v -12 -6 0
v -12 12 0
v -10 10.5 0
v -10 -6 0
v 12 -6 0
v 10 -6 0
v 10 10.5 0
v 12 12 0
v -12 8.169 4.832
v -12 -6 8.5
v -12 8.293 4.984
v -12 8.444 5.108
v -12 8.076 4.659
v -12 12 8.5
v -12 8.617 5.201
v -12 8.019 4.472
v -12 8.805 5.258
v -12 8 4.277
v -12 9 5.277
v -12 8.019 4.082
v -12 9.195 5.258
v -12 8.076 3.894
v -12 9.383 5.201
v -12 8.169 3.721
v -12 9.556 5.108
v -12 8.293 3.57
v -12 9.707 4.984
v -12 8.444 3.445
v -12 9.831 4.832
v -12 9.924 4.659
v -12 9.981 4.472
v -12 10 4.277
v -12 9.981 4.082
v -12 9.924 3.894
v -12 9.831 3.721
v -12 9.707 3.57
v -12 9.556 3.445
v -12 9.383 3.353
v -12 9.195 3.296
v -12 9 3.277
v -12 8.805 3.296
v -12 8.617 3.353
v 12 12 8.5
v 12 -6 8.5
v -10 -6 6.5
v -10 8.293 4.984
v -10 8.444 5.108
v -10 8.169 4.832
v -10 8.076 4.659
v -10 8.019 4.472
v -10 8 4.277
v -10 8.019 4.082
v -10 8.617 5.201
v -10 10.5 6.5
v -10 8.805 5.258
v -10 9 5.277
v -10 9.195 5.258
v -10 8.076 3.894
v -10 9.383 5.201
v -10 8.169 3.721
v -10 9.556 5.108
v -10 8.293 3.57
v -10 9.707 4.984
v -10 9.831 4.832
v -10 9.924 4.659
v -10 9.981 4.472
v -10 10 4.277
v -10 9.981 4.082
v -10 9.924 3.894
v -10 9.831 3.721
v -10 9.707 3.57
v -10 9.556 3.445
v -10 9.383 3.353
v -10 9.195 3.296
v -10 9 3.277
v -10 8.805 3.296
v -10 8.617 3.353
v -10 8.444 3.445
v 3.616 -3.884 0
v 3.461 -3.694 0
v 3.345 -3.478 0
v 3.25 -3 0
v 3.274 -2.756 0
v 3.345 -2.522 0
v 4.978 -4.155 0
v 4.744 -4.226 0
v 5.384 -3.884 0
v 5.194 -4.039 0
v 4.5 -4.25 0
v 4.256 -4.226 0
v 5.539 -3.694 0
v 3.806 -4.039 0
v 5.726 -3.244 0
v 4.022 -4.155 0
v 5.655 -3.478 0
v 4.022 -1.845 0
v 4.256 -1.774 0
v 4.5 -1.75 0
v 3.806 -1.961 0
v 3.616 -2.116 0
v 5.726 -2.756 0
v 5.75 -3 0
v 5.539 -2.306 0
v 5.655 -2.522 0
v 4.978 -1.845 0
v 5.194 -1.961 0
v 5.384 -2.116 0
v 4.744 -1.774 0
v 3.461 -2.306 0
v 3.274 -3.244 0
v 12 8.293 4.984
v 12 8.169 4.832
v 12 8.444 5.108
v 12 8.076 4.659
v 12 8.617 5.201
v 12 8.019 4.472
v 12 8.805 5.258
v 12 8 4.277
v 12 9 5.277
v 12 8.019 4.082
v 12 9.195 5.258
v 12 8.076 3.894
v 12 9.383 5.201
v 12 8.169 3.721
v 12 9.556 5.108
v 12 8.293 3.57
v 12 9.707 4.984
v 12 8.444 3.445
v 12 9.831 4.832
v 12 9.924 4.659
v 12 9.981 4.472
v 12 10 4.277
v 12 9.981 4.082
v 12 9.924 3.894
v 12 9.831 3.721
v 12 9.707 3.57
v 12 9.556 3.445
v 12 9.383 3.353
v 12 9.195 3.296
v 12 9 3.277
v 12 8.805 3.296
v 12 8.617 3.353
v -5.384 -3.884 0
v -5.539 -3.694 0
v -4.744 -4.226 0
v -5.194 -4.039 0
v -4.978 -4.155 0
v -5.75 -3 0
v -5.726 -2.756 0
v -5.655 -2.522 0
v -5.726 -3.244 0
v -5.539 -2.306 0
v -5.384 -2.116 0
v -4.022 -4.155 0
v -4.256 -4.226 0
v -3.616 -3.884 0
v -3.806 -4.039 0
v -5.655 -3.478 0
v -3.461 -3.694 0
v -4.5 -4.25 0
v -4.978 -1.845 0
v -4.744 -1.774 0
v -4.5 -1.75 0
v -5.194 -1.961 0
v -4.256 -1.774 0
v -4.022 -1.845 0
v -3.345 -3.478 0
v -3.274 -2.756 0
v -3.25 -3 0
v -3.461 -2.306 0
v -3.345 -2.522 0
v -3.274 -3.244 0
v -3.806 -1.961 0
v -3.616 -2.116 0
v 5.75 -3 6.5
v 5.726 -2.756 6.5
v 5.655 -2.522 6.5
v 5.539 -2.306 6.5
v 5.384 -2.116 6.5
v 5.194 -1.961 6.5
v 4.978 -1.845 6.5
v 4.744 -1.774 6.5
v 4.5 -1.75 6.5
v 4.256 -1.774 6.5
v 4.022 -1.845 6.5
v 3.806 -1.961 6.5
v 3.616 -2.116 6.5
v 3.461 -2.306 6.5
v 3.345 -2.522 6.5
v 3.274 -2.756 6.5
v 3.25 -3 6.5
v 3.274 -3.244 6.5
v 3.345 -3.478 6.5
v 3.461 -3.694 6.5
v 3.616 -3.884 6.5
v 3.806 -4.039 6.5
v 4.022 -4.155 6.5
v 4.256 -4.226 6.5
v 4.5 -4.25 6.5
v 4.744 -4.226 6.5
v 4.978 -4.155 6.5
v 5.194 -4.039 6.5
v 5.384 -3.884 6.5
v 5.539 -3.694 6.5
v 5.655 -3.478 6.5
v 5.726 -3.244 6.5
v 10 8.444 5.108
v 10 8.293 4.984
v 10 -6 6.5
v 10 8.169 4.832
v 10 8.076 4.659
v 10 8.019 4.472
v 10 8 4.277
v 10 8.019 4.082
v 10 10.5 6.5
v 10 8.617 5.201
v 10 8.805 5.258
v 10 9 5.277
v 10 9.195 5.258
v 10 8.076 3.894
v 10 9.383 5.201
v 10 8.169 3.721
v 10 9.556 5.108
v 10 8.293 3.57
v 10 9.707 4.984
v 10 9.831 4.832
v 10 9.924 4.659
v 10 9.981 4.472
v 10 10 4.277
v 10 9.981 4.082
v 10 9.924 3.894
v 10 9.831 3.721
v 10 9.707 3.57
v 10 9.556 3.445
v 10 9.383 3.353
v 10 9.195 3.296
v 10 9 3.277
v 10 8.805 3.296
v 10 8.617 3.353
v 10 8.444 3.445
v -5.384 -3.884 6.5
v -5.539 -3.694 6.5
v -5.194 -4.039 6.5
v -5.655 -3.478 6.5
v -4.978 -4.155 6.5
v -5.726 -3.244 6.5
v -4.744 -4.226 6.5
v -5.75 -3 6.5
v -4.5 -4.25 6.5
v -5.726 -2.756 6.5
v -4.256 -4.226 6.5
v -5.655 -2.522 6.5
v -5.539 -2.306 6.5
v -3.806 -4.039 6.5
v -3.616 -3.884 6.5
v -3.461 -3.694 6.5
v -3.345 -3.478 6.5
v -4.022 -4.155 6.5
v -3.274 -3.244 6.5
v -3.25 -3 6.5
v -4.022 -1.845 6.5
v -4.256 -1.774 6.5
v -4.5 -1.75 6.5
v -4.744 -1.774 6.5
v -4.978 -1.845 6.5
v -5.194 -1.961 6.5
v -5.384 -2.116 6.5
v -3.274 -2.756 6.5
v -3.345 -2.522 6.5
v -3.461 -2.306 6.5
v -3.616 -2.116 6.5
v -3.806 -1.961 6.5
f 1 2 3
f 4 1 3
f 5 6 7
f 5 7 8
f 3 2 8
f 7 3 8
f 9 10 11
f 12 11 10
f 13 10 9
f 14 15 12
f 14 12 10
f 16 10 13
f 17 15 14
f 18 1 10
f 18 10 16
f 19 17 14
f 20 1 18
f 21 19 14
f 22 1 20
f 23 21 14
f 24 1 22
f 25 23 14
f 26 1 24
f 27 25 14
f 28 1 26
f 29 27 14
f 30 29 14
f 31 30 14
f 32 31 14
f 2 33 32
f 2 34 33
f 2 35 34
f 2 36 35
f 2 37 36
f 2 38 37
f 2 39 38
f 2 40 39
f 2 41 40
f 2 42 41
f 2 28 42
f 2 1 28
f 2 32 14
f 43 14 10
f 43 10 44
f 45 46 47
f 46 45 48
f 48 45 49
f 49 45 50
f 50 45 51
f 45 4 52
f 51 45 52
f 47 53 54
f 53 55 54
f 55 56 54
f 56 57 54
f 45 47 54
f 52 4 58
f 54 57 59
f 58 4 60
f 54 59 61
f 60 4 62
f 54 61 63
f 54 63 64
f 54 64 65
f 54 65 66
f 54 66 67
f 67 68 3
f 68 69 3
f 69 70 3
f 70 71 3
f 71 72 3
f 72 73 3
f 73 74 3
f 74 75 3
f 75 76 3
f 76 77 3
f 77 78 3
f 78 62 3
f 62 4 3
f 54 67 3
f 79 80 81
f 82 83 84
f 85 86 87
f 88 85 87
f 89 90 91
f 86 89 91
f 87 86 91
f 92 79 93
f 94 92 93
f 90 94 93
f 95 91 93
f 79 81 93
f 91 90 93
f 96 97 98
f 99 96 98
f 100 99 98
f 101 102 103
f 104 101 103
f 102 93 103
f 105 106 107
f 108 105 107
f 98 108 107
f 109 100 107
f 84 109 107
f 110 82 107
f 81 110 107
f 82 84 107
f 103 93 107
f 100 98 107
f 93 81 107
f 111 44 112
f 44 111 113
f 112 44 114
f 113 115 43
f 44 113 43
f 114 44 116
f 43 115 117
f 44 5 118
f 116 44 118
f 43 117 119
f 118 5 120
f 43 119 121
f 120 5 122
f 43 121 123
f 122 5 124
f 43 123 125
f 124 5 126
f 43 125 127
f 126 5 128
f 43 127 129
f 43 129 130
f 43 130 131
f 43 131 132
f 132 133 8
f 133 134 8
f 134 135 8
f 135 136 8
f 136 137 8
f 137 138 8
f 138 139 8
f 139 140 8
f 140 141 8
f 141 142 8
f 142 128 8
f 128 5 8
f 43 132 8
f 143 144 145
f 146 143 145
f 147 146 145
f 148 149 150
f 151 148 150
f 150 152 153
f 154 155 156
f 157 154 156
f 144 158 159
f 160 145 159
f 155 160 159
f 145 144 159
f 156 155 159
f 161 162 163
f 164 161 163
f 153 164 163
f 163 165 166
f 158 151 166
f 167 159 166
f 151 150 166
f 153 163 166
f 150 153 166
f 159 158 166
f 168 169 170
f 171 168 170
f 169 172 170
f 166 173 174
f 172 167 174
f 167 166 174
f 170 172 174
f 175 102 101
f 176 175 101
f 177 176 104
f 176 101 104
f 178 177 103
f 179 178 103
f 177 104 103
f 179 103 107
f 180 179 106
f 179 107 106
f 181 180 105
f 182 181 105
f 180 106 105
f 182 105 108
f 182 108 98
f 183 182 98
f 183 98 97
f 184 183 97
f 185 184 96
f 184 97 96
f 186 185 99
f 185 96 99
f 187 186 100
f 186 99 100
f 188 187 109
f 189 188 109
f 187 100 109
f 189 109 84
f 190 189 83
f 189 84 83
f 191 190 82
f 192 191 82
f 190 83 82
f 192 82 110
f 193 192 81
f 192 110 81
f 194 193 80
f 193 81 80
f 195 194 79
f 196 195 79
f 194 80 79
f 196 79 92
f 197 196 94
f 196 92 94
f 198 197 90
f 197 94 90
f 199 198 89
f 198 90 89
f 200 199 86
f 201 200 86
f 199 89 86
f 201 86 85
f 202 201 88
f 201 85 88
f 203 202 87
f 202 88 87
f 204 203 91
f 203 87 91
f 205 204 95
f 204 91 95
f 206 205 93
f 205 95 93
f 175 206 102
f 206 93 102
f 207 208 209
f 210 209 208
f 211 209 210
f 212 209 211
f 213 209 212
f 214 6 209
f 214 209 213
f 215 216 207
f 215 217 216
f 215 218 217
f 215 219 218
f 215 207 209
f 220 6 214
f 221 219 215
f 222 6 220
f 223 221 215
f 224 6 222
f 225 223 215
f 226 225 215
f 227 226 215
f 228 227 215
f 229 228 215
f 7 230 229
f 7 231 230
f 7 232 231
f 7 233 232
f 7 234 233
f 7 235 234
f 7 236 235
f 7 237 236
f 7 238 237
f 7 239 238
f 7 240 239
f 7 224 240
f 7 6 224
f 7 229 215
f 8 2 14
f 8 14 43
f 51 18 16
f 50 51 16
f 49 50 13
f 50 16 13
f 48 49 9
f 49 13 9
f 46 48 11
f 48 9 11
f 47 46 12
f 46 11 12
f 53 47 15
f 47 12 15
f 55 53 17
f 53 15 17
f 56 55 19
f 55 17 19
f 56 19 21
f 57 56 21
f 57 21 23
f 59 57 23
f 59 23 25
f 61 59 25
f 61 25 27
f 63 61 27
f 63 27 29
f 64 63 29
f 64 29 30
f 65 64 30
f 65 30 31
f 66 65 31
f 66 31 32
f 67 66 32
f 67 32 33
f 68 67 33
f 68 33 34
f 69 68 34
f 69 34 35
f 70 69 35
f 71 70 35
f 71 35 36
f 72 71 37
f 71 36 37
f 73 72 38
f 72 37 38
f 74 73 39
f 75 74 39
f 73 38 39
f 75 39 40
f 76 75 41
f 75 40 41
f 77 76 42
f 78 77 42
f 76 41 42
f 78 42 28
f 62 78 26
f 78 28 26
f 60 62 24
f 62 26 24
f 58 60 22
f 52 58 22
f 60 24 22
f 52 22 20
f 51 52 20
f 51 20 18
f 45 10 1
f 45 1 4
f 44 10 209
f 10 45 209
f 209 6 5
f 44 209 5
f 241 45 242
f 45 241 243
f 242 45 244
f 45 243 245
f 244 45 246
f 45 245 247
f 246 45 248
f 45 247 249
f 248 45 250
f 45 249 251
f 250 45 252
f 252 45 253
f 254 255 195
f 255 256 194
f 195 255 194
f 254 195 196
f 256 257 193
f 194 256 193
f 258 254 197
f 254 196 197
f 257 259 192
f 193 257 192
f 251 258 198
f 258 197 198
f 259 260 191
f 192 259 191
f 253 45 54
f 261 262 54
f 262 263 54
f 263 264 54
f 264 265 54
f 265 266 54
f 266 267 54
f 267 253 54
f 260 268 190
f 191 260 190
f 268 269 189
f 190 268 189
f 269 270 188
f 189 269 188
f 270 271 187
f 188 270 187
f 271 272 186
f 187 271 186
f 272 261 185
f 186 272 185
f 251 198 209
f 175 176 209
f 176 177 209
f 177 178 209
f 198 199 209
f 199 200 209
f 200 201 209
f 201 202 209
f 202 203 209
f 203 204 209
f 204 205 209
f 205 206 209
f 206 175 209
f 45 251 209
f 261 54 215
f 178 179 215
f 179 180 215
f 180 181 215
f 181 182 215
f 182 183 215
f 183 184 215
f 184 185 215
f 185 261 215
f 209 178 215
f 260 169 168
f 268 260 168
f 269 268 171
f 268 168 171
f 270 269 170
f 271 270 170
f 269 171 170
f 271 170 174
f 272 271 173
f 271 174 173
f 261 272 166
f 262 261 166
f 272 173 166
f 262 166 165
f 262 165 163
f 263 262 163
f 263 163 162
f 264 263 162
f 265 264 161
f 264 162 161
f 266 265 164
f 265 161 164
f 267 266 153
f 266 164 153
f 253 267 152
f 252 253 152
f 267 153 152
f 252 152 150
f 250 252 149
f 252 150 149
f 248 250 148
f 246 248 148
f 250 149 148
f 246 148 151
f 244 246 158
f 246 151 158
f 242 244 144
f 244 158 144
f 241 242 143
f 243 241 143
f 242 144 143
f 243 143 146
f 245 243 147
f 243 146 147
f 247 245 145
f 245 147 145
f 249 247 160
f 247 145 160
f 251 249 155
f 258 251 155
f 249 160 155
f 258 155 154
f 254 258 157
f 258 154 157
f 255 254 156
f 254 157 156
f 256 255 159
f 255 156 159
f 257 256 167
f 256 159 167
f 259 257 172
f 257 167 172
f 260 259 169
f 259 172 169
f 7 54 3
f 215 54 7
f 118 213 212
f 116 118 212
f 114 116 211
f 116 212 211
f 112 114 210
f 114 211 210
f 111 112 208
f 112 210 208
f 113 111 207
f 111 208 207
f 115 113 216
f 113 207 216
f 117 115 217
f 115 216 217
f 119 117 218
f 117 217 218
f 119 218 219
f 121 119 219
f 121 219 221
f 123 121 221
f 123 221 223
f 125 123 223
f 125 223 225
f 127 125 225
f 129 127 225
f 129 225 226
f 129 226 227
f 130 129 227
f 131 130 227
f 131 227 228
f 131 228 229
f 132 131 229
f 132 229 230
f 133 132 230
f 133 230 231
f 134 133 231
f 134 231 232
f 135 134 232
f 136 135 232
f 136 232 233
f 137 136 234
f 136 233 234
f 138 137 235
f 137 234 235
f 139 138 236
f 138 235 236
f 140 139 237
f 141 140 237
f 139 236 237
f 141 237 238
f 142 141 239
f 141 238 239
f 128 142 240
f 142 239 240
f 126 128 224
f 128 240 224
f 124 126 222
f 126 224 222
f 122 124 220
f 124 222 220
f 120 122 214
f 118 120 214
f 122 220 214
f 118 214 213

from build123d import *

# Parameters (mm, degrees)
F0_W      = 24
F0_H      = 18
F2_DEPTH  = 8.5
F1_W      = 20
F1_H      = 12
F1_R      = 1.25
F3_DEPTH  = 6.5
F4_R      = 1
F5_DEPTH  = 25
F3_FACE_W = 20
F3_FACE_H = 6.5
F6_DEPTH  = 4.5


with BuildPart() as f2:
    # F0 (on Top) → F2 (new body)
    with BuildSketch(Plane.XY):
        with Locations((0, 3)):
            Rectangle(F0_W, F0_H)
    extrude(amount=F2_DEPTH)

    # F1 (on Top) → F3 (cut)
    with BuildSketch(Plane.XY):
        Rectangle(F1_W, F1_H)
        with Locations((-4.5, -3)):
            Circle(F1_R, mode=Mode.SUBTRACT)
        with Locations((4.5, -3)):
            Circle(F1_R, mode=Mode.SUBTRACT)
    extrude(amount=F3_DEPTH, mode=Mode.SUBTRACT)

    # F4 (on face) → F5 (cut)
    with BuildSketch(Plane(origin=(-12, 0, 0), x_dir=(0, -1, 0), z_dir=(-1, 0, 0))):
        with Locations((-9, 4.276814)):
            Circle(F4_R)
    extrude(amount=-F5_DEPTH, mode=Mode.SUBTRACT)

    # F3_face (on face) → F6 (cut)
    with BuildSketch(Plane(origin=(0, 6, 3.25), x_dir=(1, 0, 0), z_dir=(0, -1, 0))):
        Rectangle(F3_FACE_W, F3_FACE_H)
    extrude(amount=-F6_DEPTH, mode=Mode.SUBTRACT)


solid = f2.part
